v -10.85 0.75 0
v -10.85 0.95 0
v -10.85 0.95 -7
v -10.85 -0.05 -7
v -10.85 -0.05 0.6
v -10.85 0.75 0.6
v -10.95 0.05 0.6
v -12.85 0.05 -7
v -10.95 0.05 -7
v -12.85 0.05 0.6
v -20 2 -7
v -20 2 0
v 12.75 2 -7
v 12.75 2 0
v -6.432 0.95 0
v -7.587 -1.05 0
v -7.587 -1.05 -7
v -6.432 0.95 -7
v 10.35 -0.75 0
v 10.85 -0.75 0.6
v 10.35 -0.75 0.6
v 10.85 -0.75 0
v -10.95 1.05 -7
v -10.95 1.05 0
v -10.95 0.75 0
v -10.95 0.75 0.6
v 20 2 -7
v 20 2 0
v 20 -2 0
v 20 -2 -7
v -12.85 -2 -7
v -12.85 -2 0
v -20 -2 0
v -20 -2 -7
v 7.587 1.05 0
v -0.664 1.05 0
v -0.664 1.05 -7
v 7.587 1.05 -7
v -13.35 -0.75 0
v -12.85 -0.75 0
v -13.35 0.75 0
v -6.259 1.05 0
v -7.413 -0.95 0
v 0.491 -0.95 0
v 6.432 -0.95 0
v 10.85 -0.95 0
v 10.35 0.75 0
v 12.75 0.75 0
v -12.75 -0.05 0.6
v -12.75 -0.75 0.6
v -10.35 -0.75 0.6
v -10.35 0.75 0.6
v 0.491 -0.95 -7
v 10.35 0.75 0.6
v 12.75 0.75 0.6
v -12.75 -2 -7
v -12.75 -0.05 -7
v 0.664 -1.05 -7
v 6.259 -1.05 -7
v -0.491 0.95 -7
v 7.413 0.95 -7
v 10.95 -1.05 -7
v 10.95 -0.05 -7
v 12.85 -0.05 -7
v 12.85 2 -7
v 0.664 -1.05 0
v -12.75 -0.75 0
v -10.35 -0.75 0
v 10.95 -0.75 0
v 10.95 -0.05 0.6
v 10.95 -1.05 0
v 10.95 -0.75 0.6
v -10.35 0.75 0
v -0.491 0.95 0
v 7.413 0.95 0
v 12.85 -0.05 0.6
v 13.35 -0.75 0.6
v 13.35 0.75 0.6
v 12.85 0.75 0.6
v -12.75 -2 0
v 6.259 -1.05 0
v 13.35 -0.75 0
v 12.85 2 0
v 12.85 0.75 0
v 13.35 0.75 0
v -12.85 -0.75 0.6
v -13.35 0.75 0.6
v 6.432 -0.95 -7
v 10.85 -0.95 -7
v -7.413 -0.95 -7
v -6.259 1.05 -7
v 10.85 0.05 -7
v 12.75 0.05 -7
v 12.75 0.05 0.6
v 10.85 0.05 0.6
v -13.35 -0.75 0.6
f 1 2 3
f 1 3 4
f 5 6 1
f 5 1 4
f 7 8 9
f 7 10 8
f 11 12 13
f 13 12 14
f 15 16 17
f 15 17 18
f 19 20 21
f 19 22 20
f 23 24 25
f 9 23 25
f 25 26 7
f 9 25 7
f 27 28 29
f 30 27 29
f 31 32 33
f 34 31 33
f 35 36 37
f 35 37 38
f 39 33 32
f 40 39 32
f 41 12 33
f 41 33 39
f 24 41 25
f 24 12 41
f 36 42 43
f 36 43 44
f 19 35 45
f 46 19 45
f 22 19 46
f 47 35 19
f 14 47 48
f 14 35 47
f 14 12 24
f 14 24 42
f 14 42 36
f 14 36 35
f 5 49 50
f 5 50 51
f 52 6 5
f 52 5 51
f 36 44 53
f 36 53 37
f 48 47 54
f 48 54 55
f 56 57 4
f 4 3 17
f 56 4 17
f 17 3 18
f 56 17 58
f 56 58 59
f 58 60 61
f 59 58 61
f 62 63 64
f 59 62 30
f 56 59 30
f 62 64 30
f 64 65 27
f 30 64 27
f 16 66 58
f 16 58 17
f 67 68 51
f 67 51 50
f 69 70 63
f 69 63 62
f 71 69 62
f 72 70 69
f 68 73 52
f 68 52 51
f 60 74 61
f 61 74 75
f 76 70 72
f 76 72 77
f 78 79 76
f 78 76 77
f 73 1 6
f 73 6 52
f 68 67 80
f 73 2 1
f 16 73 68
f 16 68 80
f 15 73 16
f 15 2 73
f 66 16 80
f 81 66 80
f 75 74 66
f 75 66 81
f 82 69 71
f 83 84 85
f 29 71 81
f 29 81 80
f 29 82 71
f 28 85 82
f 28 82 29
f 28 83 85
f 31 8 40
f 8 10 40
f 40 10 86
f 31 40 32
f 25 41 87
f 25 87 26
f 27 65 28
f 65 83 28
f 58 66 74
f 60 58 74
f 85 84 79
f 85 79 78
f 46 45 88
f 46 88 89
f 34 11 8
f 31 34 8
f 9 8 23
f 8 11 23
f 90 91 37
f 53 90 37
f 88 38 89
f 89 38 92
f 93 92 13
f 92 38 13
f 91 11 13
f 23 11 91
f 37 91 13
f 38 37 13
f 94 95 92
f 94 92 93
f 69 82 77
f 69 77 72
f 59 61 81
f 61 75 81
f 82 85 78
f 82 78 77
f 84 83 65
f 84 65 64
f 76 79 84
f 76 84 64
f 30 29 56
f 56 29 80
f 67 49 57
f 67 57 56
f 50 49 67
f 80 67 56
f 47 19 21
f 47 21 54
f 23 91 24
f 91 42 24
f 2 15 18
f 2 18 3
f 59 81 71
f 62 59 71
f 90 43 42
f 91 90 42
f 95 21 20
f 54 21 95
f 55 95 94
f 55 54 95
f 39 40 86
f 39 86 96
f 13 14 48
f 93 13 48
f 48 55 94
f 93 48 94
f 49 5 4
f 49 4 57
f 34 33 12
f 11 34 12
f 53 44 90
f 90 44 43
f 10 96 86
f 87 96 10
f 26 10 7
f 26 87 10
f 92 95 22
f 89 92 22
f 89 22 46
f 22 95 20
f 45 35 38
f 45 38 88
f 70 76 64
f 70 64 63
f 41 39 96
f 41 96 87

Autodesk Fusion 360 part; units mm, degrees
sketch "Sketch1" plane through (0, 0, 0) normal (0, 0, 1) x (1, 0, 0)
  line L0 (20, -2) -> (-20, -2)
  line L1 (-20, -2) -> (-20, 2)
  line L2 (-20, 2) -> (20, 2)
  line L3 (20, 2) -> (20, -2)
  line L4 (20, -2) -> (-20, 2) construction
  line L5 (-20, -2) -> (20, 2) construction
  line L6 (0, 0) -> (0, -2) construction
  line L7 (0, 0) -> (0, 2) construction
  line L8 (-12.45, 2) -> (-12.45, -2) construction
  line L9 (-11.25, 2) -> (-11.25, -2) construction
  line L10 (-12.75, 2) -> (-12.75, -2)
  line L11 (-10.95, 2) -> (-10.95, -2)
  line L12 (-10.85, 2) -> (-10.85, -2)
  line L13 (-12.85, 2) -> (-12.85, -2)
  line L14 (-11.85, 2) -> (-11.85, -2) construction
  line L15 (-20, 0.05) -> (20, 0.05)
  line L16 (20, -0.05) -> (-20, -0.05)
  line L17 (-20, 0) -> (20, 0) construction
  line L18 (0.5774, -1) -> (-0.5774, 1) construction
  line L19 (0.5774, -1) -> (-7.5, -1) construction
  line L20 (-7.5, -1) -> (-6.3453, 1) construction
  line L21 (-6.3453, 1) -> (-10.95, 1) construction
  line L22 (-0.5774, 1) -> (7.5, 1) construction
  line L23 (7.5, 1) -> (6.3453, -1) construction
  line L24 (6.3453, -1) -> (10.95, -1) construction
  line L25 (-3.4613, -1) -> (-3.4613, 1.05) construction
  line L26 (3.4613, 1) -> (3.4613, -1.05) construction
  line L27 (-6.2587, 1.05) -> (-10.95, 1.05)
  line L28 (-7.4134, -0.95) -> (-6.2587, 1.05)
  line L29 (0.4907, -0.95) -> (-7.4134, -0.95)
  line L30 (0.4907, -0.95) -> (-0.664, 1.05)
  line L31 (-0.664, 1.05) -> (7.5866, 1.05)
  line L32 (7.5866, 1.05) -> (6.4319, -0.95)
  line L33 (6.4319, -0.95) -> (10.95, -0.95)
  line L34 (12.85, 2) -> (12.85, -2)
  line L35 (12.75, 2) -> (12.75, -2)
  line L36 (12.45, 2) -> (12.45, -2) construction
  line L37 (11.25, 2) -> (11.25, -2) construction
  line L38 (10.95, 2) -> (10.95, -2)
  line L39 (10.85, 2) -> (10.85, -2)
  line L40 (-6.4319, 0.95) -> (-10.95, 0.95)
  line L41 (-7.5866, -1.05) -> (-6.4319, 0.95)
  line L42 (0.664, -1.05) -> (-7.5866, -1.05)
  line L43 (0.664, -1.05) -> (-0.4907, 0.95)
  line L44 (-0.4907, 0.95) -> (7.4134, 0.95)
  line L45 (7.4134, 0.95) -> (6.2587, -1.05)
  line L46 (6.2587, -1.05) -> (10.95, -1.05)
  line L47 (11.85, 2) -> (11.85, -2) construction
  line L48 (-10.35, -0.75) -> (-13.35, -0.75)
  line L49 (-13.35, -0.75) -> (-13.35, 0.75)
  line L50 (-13.35, 0.75) -> (-10.35, 0.75)
  line L51 (-10.35, 0.75) -> (-10.35, -0.75)
  line L52 (-10.35, -0.75) -> (-13.35, 0.75) construction
  line L53 (-13.35, -0.75) -> (-10.35, 0.75) construction
  line L54 (13.35, -0.75) -> (10.35, -0.75)
  line L55 (10.35, -0.75) -> (10.35, 0.75)
  line L56 (10.35, 0.75) -> (13.35, 0.75)
  line L57 (13.35, 0.75) -> (13.35, -0.75)
  line L58 (13.35, -0.75) -> (10.35, 0.75) construction
  line L59 (10.35, -0.75) -> (13.35, 0.75) construction
  point P0 (-11.85, 0)
  point P1 (11.85, 0)
  dimension "d1" = 4
  dimension "d2" = 40
  dimension "d16" = 0.1
  dimension "d57" = 0.1
  dimension "d60" = 2
  dimension "d61" = 30
  dimension "d62" = 15
  dimension "d63" = 0.05
  dimension "d69" = 1.2
  dimension "d70" = 1.8
  dimension "d73" = 22.5
  dimension "d74" = -0.05
  dimension "d113" = 3
  dimension "d114" = 1.5
sketch "Sketch2" plane through (0, 0, 0) normal (0, 1, 0) x (1, 0, 0)
  line L0 (12.75, -0.3) -> (12.75, 0)
  line L1 (12.75, 0) -> (10.95, 0)
  line L2 (10.95, 0) -> (10.95, -0.3)
  line L3 (11.25, -2.4) -> (12.45, -2.4)
  line L4 (12.45, -2.4) -> (12.45, -1.8)
  line L5 (11.25, -1.8) -> (11.25, -2.4)
  line L6 (11.25, -1.8) -> (11.45, -1.8)
  line L7 (11.45, -1.8) -> (11.45, -0.3)
  line L8 (11.45, -0.3) -> (10.95, -0.3)
  line L9 (12.75, -0.3) -> (12.25, -0.3)
  line L10 (12.25, -0.3) -> (12.25, -1.8)
  line L11 (12.25, -1.8) -> (12.45, -1.8)
  line L12 (11.85, 0) -> (11.85, -2.4) construction
  line L13 (-12.45, -1.8) -> (-12.45, -2.4)
  line L14 (-11.85, 0) -> (-11.85, -2.4) construction
  line L15 (-10.95, 0) -> (-12.75, 0)
  line L16 (-12.45, -2.4) -> (-11.25, -2.4)
  line L17 (-11.45, -1.8) -> (-11.25, -1.8)
  line L18 (-12.75, 0) -> (-12.75, -0.3)
  line L19 (-11.25, -2.4) -> (-11.25, -1.8)
  line L20 (-10.95, -0.3) -> (-11.45, -0.3)
  line L21 (-11.45, -0.3) -> (-11.45, -1.8)
  line L22 (-12.25, -0.3) -> (-12.75, -0.3)
  line L23 (-10.95, -0.3) -> (-10.95, 0)
  line L24 (-12.45, -1.8) -> (-12.25, -1.8)
  line L25 (-12.25, -1.8) -> (-12.25, -0.3)
  line L26 (-24.446, 2) -> (24.446, 2)
  line L27 (25.475, 2.285) -> (29.5145, 4.7087)
  line L28 (30, 7) -> (-30, 7)
  line L29 (-29.5145, 4.7087) -> (-25.475, 2.285)
  line L30 (0, 0) -> (0, 2) construction
  line L31 (0, 2) -> (0, 7) construction
  line L32 (-20, 0) -> (20, 0) construction
  arc A0 (-25.475, 2.285) -> (-24.446, 2) centre (-24.446, 4) ccw
  arc A1 (24.446, 2) -> (25.475, 2.285) centre (24.446, 4) ccw
  line L33 (-30, 5.5662) -> (-30, 7)
  line L34 (30, 7) -> (30, 5.5662)
  arc A2 (-30, 5.5662) -> (-29.5145, 4.7087) centre (-29, 5.5662) ccw
  arc A3 (29.5145, 4.7087) -> (30, 5.5662) centre (29, 5.5662) ccw
  point P0 (-11.85, 0)
  point P1 (11.85, 0)
  point P2 (12.45, 0)
  point P3 (12.75, 0)
  point P4 (-11.25, 0)
  point P5 (-10.95, 0)
  point P6 (-25, 2)
  point P7 (25, 2)
  point P8 (-30, 5)
  dimension "d77" = 0.3
  dimension "d85" = 1.2
  dimension "d87" = 0.6
  dimension "d88" = 0.8
  dimension "d94" = 2.4
  dimension "d123" = 2
  dimension "d124" = 5
  dimension "d127" = 50
  dimension "d128" = 40
  dimension "d129" = 2
  dimension "d132" = 60
  dimension "d136" = 1
  dimension "d139" = 2
extrude "Extrude2" add sketch "Sketch1" against normal up to surface (7 mm away) contours L15 L35 L38 L56 | L16 L39 L54 L55 | L16 L32 L33 L39 L54 L55 | L2 L35 L38 L56 | L15 L16 L39 L55 | L15 L38 L39 L56 | L2 L38 L39 L56 | L15 L16 L32 L55 | L15 L39 L55 L56 | L2 L12 L15 L27 L28 L30 L31 L32 L39 L55 L56 | L0 L1 L13 L16 L48 L49 | L2 L11 L12 L27 | L13 L16 L48 L49 | L10 L11 L15 L50 | L16 L28 L29 L30 | L15 L16 L28 L30 | L2 L10 L11 L50 | L1 L15 L16 L49 | L13 L15 L16 L49 | L10 L13 L15 L50 | L2 L10 L13 L50 | L1 L2 L13 L15 L49 L50 | L13 L15 L49 L50 makes body 1
extrude "Extrude3" add sketch "Sketch1" along normal blind 0.6 contours L15 L35 L38 L56 | L16 L39 L54 L55 | L15 L16 L39 L55 | L15 L38 L39 L56 | L15 L39 L55 L56 | L13 L16 L48 L49 | L10 L11 L15 L50 | L13 L15 L16 L49 | L10 L13 L15 L50 | L13 L15 L49 L50 bodies 1
extrude "Extrude1" add sketch "Sketch1" against normal up to surface (7 mm away) separate body contours L0 L3 L16 L34 L54 L57 | L0 L34 L35 L54 | L3 L15 L16 L57 | L0 L35 L38 L54 | L16 L34 L35 L54 | L16 L34 L54 L57 | L2 L3 L15 L34 L56 L57 | L15 L16 L34 L57 | L0 L38 L39 L46 | L16 L35 L38 L54 | L15 L34 L56 L57 | L0 L12 L16 L39 L41 L42 L43 L45 L46 L48 L51 | L0 L11 L12 L48 | L0 L10 L11 L48 | L11 L12 L16 L48 | L12 L16 L48 L51 | L10 L11 L16 L48 | L12 L15 L16 L51 | L15 L16 L43 L45 | L12 L15 L50 L51 | L15 L16 L41 L51 | L15 L43 L44 L45 | L12 L15 L40 L41 L50 L51 makes body 2 in component "Join 2"
extrude "Extrude2'" add sketch "Sketch1" along normal up to surface (0.6 mm away) contours L16 L34 L35 L54 | L16 L34 L54 L57 | L15 L16 L34 L57 | L16 L35 L38 L54 | L15 L34 L56 L57 | L11 L12 L16 L48 | L12 L16 L48 L51 | L10 L11 L16 L48 | L12 L15 L16 L51 | L12 L15 L50 L51 bodies 2 in component "Join 2"
component "Join 2" placed x (1, 0, 0) y (0, 1, 0) z (0, 0, 1) at (0, 0, 0)
equation "d1 = d62 / 3.75"
equation "d2 = d1 * 10"
equation "d57 = Tollerance"
equation "d60 = d1 / 2"
equation "d62 = d73 / 1.5"
equation "d69 = d73 / 18.75"
equation "d70 = d69 * 1.5"
equation "d73 = Gauge"
equation "d77 = d85 / 4"
equation "d87 = d85 / 2"
equation "d88 = d85 / 3 * 2"
equation "d94 = d85 * 2"
equation "Gauge = 22.5 mm"
equation "SleeperThickness = 2 mm"
equation "Tollerance = 0.1 mm"
equation "SleeperSpcing = Gauge / 1.5"
equation "d113 = d69 * 2.5"
equation "d114 = d113 / 2"
equation "d115 = Gauge / 37.5"
equation "d123 = SleeperThickness"
equation "d124 = SleeperThickness * 2.5"
equation "d127 = d128 * 1.25"
equation "d129 = d128 / 20"
equation "d132 = d128 * 1.5"
equation "d136 = d129 / 2"
equation "d139 = d124 / 2.5"
